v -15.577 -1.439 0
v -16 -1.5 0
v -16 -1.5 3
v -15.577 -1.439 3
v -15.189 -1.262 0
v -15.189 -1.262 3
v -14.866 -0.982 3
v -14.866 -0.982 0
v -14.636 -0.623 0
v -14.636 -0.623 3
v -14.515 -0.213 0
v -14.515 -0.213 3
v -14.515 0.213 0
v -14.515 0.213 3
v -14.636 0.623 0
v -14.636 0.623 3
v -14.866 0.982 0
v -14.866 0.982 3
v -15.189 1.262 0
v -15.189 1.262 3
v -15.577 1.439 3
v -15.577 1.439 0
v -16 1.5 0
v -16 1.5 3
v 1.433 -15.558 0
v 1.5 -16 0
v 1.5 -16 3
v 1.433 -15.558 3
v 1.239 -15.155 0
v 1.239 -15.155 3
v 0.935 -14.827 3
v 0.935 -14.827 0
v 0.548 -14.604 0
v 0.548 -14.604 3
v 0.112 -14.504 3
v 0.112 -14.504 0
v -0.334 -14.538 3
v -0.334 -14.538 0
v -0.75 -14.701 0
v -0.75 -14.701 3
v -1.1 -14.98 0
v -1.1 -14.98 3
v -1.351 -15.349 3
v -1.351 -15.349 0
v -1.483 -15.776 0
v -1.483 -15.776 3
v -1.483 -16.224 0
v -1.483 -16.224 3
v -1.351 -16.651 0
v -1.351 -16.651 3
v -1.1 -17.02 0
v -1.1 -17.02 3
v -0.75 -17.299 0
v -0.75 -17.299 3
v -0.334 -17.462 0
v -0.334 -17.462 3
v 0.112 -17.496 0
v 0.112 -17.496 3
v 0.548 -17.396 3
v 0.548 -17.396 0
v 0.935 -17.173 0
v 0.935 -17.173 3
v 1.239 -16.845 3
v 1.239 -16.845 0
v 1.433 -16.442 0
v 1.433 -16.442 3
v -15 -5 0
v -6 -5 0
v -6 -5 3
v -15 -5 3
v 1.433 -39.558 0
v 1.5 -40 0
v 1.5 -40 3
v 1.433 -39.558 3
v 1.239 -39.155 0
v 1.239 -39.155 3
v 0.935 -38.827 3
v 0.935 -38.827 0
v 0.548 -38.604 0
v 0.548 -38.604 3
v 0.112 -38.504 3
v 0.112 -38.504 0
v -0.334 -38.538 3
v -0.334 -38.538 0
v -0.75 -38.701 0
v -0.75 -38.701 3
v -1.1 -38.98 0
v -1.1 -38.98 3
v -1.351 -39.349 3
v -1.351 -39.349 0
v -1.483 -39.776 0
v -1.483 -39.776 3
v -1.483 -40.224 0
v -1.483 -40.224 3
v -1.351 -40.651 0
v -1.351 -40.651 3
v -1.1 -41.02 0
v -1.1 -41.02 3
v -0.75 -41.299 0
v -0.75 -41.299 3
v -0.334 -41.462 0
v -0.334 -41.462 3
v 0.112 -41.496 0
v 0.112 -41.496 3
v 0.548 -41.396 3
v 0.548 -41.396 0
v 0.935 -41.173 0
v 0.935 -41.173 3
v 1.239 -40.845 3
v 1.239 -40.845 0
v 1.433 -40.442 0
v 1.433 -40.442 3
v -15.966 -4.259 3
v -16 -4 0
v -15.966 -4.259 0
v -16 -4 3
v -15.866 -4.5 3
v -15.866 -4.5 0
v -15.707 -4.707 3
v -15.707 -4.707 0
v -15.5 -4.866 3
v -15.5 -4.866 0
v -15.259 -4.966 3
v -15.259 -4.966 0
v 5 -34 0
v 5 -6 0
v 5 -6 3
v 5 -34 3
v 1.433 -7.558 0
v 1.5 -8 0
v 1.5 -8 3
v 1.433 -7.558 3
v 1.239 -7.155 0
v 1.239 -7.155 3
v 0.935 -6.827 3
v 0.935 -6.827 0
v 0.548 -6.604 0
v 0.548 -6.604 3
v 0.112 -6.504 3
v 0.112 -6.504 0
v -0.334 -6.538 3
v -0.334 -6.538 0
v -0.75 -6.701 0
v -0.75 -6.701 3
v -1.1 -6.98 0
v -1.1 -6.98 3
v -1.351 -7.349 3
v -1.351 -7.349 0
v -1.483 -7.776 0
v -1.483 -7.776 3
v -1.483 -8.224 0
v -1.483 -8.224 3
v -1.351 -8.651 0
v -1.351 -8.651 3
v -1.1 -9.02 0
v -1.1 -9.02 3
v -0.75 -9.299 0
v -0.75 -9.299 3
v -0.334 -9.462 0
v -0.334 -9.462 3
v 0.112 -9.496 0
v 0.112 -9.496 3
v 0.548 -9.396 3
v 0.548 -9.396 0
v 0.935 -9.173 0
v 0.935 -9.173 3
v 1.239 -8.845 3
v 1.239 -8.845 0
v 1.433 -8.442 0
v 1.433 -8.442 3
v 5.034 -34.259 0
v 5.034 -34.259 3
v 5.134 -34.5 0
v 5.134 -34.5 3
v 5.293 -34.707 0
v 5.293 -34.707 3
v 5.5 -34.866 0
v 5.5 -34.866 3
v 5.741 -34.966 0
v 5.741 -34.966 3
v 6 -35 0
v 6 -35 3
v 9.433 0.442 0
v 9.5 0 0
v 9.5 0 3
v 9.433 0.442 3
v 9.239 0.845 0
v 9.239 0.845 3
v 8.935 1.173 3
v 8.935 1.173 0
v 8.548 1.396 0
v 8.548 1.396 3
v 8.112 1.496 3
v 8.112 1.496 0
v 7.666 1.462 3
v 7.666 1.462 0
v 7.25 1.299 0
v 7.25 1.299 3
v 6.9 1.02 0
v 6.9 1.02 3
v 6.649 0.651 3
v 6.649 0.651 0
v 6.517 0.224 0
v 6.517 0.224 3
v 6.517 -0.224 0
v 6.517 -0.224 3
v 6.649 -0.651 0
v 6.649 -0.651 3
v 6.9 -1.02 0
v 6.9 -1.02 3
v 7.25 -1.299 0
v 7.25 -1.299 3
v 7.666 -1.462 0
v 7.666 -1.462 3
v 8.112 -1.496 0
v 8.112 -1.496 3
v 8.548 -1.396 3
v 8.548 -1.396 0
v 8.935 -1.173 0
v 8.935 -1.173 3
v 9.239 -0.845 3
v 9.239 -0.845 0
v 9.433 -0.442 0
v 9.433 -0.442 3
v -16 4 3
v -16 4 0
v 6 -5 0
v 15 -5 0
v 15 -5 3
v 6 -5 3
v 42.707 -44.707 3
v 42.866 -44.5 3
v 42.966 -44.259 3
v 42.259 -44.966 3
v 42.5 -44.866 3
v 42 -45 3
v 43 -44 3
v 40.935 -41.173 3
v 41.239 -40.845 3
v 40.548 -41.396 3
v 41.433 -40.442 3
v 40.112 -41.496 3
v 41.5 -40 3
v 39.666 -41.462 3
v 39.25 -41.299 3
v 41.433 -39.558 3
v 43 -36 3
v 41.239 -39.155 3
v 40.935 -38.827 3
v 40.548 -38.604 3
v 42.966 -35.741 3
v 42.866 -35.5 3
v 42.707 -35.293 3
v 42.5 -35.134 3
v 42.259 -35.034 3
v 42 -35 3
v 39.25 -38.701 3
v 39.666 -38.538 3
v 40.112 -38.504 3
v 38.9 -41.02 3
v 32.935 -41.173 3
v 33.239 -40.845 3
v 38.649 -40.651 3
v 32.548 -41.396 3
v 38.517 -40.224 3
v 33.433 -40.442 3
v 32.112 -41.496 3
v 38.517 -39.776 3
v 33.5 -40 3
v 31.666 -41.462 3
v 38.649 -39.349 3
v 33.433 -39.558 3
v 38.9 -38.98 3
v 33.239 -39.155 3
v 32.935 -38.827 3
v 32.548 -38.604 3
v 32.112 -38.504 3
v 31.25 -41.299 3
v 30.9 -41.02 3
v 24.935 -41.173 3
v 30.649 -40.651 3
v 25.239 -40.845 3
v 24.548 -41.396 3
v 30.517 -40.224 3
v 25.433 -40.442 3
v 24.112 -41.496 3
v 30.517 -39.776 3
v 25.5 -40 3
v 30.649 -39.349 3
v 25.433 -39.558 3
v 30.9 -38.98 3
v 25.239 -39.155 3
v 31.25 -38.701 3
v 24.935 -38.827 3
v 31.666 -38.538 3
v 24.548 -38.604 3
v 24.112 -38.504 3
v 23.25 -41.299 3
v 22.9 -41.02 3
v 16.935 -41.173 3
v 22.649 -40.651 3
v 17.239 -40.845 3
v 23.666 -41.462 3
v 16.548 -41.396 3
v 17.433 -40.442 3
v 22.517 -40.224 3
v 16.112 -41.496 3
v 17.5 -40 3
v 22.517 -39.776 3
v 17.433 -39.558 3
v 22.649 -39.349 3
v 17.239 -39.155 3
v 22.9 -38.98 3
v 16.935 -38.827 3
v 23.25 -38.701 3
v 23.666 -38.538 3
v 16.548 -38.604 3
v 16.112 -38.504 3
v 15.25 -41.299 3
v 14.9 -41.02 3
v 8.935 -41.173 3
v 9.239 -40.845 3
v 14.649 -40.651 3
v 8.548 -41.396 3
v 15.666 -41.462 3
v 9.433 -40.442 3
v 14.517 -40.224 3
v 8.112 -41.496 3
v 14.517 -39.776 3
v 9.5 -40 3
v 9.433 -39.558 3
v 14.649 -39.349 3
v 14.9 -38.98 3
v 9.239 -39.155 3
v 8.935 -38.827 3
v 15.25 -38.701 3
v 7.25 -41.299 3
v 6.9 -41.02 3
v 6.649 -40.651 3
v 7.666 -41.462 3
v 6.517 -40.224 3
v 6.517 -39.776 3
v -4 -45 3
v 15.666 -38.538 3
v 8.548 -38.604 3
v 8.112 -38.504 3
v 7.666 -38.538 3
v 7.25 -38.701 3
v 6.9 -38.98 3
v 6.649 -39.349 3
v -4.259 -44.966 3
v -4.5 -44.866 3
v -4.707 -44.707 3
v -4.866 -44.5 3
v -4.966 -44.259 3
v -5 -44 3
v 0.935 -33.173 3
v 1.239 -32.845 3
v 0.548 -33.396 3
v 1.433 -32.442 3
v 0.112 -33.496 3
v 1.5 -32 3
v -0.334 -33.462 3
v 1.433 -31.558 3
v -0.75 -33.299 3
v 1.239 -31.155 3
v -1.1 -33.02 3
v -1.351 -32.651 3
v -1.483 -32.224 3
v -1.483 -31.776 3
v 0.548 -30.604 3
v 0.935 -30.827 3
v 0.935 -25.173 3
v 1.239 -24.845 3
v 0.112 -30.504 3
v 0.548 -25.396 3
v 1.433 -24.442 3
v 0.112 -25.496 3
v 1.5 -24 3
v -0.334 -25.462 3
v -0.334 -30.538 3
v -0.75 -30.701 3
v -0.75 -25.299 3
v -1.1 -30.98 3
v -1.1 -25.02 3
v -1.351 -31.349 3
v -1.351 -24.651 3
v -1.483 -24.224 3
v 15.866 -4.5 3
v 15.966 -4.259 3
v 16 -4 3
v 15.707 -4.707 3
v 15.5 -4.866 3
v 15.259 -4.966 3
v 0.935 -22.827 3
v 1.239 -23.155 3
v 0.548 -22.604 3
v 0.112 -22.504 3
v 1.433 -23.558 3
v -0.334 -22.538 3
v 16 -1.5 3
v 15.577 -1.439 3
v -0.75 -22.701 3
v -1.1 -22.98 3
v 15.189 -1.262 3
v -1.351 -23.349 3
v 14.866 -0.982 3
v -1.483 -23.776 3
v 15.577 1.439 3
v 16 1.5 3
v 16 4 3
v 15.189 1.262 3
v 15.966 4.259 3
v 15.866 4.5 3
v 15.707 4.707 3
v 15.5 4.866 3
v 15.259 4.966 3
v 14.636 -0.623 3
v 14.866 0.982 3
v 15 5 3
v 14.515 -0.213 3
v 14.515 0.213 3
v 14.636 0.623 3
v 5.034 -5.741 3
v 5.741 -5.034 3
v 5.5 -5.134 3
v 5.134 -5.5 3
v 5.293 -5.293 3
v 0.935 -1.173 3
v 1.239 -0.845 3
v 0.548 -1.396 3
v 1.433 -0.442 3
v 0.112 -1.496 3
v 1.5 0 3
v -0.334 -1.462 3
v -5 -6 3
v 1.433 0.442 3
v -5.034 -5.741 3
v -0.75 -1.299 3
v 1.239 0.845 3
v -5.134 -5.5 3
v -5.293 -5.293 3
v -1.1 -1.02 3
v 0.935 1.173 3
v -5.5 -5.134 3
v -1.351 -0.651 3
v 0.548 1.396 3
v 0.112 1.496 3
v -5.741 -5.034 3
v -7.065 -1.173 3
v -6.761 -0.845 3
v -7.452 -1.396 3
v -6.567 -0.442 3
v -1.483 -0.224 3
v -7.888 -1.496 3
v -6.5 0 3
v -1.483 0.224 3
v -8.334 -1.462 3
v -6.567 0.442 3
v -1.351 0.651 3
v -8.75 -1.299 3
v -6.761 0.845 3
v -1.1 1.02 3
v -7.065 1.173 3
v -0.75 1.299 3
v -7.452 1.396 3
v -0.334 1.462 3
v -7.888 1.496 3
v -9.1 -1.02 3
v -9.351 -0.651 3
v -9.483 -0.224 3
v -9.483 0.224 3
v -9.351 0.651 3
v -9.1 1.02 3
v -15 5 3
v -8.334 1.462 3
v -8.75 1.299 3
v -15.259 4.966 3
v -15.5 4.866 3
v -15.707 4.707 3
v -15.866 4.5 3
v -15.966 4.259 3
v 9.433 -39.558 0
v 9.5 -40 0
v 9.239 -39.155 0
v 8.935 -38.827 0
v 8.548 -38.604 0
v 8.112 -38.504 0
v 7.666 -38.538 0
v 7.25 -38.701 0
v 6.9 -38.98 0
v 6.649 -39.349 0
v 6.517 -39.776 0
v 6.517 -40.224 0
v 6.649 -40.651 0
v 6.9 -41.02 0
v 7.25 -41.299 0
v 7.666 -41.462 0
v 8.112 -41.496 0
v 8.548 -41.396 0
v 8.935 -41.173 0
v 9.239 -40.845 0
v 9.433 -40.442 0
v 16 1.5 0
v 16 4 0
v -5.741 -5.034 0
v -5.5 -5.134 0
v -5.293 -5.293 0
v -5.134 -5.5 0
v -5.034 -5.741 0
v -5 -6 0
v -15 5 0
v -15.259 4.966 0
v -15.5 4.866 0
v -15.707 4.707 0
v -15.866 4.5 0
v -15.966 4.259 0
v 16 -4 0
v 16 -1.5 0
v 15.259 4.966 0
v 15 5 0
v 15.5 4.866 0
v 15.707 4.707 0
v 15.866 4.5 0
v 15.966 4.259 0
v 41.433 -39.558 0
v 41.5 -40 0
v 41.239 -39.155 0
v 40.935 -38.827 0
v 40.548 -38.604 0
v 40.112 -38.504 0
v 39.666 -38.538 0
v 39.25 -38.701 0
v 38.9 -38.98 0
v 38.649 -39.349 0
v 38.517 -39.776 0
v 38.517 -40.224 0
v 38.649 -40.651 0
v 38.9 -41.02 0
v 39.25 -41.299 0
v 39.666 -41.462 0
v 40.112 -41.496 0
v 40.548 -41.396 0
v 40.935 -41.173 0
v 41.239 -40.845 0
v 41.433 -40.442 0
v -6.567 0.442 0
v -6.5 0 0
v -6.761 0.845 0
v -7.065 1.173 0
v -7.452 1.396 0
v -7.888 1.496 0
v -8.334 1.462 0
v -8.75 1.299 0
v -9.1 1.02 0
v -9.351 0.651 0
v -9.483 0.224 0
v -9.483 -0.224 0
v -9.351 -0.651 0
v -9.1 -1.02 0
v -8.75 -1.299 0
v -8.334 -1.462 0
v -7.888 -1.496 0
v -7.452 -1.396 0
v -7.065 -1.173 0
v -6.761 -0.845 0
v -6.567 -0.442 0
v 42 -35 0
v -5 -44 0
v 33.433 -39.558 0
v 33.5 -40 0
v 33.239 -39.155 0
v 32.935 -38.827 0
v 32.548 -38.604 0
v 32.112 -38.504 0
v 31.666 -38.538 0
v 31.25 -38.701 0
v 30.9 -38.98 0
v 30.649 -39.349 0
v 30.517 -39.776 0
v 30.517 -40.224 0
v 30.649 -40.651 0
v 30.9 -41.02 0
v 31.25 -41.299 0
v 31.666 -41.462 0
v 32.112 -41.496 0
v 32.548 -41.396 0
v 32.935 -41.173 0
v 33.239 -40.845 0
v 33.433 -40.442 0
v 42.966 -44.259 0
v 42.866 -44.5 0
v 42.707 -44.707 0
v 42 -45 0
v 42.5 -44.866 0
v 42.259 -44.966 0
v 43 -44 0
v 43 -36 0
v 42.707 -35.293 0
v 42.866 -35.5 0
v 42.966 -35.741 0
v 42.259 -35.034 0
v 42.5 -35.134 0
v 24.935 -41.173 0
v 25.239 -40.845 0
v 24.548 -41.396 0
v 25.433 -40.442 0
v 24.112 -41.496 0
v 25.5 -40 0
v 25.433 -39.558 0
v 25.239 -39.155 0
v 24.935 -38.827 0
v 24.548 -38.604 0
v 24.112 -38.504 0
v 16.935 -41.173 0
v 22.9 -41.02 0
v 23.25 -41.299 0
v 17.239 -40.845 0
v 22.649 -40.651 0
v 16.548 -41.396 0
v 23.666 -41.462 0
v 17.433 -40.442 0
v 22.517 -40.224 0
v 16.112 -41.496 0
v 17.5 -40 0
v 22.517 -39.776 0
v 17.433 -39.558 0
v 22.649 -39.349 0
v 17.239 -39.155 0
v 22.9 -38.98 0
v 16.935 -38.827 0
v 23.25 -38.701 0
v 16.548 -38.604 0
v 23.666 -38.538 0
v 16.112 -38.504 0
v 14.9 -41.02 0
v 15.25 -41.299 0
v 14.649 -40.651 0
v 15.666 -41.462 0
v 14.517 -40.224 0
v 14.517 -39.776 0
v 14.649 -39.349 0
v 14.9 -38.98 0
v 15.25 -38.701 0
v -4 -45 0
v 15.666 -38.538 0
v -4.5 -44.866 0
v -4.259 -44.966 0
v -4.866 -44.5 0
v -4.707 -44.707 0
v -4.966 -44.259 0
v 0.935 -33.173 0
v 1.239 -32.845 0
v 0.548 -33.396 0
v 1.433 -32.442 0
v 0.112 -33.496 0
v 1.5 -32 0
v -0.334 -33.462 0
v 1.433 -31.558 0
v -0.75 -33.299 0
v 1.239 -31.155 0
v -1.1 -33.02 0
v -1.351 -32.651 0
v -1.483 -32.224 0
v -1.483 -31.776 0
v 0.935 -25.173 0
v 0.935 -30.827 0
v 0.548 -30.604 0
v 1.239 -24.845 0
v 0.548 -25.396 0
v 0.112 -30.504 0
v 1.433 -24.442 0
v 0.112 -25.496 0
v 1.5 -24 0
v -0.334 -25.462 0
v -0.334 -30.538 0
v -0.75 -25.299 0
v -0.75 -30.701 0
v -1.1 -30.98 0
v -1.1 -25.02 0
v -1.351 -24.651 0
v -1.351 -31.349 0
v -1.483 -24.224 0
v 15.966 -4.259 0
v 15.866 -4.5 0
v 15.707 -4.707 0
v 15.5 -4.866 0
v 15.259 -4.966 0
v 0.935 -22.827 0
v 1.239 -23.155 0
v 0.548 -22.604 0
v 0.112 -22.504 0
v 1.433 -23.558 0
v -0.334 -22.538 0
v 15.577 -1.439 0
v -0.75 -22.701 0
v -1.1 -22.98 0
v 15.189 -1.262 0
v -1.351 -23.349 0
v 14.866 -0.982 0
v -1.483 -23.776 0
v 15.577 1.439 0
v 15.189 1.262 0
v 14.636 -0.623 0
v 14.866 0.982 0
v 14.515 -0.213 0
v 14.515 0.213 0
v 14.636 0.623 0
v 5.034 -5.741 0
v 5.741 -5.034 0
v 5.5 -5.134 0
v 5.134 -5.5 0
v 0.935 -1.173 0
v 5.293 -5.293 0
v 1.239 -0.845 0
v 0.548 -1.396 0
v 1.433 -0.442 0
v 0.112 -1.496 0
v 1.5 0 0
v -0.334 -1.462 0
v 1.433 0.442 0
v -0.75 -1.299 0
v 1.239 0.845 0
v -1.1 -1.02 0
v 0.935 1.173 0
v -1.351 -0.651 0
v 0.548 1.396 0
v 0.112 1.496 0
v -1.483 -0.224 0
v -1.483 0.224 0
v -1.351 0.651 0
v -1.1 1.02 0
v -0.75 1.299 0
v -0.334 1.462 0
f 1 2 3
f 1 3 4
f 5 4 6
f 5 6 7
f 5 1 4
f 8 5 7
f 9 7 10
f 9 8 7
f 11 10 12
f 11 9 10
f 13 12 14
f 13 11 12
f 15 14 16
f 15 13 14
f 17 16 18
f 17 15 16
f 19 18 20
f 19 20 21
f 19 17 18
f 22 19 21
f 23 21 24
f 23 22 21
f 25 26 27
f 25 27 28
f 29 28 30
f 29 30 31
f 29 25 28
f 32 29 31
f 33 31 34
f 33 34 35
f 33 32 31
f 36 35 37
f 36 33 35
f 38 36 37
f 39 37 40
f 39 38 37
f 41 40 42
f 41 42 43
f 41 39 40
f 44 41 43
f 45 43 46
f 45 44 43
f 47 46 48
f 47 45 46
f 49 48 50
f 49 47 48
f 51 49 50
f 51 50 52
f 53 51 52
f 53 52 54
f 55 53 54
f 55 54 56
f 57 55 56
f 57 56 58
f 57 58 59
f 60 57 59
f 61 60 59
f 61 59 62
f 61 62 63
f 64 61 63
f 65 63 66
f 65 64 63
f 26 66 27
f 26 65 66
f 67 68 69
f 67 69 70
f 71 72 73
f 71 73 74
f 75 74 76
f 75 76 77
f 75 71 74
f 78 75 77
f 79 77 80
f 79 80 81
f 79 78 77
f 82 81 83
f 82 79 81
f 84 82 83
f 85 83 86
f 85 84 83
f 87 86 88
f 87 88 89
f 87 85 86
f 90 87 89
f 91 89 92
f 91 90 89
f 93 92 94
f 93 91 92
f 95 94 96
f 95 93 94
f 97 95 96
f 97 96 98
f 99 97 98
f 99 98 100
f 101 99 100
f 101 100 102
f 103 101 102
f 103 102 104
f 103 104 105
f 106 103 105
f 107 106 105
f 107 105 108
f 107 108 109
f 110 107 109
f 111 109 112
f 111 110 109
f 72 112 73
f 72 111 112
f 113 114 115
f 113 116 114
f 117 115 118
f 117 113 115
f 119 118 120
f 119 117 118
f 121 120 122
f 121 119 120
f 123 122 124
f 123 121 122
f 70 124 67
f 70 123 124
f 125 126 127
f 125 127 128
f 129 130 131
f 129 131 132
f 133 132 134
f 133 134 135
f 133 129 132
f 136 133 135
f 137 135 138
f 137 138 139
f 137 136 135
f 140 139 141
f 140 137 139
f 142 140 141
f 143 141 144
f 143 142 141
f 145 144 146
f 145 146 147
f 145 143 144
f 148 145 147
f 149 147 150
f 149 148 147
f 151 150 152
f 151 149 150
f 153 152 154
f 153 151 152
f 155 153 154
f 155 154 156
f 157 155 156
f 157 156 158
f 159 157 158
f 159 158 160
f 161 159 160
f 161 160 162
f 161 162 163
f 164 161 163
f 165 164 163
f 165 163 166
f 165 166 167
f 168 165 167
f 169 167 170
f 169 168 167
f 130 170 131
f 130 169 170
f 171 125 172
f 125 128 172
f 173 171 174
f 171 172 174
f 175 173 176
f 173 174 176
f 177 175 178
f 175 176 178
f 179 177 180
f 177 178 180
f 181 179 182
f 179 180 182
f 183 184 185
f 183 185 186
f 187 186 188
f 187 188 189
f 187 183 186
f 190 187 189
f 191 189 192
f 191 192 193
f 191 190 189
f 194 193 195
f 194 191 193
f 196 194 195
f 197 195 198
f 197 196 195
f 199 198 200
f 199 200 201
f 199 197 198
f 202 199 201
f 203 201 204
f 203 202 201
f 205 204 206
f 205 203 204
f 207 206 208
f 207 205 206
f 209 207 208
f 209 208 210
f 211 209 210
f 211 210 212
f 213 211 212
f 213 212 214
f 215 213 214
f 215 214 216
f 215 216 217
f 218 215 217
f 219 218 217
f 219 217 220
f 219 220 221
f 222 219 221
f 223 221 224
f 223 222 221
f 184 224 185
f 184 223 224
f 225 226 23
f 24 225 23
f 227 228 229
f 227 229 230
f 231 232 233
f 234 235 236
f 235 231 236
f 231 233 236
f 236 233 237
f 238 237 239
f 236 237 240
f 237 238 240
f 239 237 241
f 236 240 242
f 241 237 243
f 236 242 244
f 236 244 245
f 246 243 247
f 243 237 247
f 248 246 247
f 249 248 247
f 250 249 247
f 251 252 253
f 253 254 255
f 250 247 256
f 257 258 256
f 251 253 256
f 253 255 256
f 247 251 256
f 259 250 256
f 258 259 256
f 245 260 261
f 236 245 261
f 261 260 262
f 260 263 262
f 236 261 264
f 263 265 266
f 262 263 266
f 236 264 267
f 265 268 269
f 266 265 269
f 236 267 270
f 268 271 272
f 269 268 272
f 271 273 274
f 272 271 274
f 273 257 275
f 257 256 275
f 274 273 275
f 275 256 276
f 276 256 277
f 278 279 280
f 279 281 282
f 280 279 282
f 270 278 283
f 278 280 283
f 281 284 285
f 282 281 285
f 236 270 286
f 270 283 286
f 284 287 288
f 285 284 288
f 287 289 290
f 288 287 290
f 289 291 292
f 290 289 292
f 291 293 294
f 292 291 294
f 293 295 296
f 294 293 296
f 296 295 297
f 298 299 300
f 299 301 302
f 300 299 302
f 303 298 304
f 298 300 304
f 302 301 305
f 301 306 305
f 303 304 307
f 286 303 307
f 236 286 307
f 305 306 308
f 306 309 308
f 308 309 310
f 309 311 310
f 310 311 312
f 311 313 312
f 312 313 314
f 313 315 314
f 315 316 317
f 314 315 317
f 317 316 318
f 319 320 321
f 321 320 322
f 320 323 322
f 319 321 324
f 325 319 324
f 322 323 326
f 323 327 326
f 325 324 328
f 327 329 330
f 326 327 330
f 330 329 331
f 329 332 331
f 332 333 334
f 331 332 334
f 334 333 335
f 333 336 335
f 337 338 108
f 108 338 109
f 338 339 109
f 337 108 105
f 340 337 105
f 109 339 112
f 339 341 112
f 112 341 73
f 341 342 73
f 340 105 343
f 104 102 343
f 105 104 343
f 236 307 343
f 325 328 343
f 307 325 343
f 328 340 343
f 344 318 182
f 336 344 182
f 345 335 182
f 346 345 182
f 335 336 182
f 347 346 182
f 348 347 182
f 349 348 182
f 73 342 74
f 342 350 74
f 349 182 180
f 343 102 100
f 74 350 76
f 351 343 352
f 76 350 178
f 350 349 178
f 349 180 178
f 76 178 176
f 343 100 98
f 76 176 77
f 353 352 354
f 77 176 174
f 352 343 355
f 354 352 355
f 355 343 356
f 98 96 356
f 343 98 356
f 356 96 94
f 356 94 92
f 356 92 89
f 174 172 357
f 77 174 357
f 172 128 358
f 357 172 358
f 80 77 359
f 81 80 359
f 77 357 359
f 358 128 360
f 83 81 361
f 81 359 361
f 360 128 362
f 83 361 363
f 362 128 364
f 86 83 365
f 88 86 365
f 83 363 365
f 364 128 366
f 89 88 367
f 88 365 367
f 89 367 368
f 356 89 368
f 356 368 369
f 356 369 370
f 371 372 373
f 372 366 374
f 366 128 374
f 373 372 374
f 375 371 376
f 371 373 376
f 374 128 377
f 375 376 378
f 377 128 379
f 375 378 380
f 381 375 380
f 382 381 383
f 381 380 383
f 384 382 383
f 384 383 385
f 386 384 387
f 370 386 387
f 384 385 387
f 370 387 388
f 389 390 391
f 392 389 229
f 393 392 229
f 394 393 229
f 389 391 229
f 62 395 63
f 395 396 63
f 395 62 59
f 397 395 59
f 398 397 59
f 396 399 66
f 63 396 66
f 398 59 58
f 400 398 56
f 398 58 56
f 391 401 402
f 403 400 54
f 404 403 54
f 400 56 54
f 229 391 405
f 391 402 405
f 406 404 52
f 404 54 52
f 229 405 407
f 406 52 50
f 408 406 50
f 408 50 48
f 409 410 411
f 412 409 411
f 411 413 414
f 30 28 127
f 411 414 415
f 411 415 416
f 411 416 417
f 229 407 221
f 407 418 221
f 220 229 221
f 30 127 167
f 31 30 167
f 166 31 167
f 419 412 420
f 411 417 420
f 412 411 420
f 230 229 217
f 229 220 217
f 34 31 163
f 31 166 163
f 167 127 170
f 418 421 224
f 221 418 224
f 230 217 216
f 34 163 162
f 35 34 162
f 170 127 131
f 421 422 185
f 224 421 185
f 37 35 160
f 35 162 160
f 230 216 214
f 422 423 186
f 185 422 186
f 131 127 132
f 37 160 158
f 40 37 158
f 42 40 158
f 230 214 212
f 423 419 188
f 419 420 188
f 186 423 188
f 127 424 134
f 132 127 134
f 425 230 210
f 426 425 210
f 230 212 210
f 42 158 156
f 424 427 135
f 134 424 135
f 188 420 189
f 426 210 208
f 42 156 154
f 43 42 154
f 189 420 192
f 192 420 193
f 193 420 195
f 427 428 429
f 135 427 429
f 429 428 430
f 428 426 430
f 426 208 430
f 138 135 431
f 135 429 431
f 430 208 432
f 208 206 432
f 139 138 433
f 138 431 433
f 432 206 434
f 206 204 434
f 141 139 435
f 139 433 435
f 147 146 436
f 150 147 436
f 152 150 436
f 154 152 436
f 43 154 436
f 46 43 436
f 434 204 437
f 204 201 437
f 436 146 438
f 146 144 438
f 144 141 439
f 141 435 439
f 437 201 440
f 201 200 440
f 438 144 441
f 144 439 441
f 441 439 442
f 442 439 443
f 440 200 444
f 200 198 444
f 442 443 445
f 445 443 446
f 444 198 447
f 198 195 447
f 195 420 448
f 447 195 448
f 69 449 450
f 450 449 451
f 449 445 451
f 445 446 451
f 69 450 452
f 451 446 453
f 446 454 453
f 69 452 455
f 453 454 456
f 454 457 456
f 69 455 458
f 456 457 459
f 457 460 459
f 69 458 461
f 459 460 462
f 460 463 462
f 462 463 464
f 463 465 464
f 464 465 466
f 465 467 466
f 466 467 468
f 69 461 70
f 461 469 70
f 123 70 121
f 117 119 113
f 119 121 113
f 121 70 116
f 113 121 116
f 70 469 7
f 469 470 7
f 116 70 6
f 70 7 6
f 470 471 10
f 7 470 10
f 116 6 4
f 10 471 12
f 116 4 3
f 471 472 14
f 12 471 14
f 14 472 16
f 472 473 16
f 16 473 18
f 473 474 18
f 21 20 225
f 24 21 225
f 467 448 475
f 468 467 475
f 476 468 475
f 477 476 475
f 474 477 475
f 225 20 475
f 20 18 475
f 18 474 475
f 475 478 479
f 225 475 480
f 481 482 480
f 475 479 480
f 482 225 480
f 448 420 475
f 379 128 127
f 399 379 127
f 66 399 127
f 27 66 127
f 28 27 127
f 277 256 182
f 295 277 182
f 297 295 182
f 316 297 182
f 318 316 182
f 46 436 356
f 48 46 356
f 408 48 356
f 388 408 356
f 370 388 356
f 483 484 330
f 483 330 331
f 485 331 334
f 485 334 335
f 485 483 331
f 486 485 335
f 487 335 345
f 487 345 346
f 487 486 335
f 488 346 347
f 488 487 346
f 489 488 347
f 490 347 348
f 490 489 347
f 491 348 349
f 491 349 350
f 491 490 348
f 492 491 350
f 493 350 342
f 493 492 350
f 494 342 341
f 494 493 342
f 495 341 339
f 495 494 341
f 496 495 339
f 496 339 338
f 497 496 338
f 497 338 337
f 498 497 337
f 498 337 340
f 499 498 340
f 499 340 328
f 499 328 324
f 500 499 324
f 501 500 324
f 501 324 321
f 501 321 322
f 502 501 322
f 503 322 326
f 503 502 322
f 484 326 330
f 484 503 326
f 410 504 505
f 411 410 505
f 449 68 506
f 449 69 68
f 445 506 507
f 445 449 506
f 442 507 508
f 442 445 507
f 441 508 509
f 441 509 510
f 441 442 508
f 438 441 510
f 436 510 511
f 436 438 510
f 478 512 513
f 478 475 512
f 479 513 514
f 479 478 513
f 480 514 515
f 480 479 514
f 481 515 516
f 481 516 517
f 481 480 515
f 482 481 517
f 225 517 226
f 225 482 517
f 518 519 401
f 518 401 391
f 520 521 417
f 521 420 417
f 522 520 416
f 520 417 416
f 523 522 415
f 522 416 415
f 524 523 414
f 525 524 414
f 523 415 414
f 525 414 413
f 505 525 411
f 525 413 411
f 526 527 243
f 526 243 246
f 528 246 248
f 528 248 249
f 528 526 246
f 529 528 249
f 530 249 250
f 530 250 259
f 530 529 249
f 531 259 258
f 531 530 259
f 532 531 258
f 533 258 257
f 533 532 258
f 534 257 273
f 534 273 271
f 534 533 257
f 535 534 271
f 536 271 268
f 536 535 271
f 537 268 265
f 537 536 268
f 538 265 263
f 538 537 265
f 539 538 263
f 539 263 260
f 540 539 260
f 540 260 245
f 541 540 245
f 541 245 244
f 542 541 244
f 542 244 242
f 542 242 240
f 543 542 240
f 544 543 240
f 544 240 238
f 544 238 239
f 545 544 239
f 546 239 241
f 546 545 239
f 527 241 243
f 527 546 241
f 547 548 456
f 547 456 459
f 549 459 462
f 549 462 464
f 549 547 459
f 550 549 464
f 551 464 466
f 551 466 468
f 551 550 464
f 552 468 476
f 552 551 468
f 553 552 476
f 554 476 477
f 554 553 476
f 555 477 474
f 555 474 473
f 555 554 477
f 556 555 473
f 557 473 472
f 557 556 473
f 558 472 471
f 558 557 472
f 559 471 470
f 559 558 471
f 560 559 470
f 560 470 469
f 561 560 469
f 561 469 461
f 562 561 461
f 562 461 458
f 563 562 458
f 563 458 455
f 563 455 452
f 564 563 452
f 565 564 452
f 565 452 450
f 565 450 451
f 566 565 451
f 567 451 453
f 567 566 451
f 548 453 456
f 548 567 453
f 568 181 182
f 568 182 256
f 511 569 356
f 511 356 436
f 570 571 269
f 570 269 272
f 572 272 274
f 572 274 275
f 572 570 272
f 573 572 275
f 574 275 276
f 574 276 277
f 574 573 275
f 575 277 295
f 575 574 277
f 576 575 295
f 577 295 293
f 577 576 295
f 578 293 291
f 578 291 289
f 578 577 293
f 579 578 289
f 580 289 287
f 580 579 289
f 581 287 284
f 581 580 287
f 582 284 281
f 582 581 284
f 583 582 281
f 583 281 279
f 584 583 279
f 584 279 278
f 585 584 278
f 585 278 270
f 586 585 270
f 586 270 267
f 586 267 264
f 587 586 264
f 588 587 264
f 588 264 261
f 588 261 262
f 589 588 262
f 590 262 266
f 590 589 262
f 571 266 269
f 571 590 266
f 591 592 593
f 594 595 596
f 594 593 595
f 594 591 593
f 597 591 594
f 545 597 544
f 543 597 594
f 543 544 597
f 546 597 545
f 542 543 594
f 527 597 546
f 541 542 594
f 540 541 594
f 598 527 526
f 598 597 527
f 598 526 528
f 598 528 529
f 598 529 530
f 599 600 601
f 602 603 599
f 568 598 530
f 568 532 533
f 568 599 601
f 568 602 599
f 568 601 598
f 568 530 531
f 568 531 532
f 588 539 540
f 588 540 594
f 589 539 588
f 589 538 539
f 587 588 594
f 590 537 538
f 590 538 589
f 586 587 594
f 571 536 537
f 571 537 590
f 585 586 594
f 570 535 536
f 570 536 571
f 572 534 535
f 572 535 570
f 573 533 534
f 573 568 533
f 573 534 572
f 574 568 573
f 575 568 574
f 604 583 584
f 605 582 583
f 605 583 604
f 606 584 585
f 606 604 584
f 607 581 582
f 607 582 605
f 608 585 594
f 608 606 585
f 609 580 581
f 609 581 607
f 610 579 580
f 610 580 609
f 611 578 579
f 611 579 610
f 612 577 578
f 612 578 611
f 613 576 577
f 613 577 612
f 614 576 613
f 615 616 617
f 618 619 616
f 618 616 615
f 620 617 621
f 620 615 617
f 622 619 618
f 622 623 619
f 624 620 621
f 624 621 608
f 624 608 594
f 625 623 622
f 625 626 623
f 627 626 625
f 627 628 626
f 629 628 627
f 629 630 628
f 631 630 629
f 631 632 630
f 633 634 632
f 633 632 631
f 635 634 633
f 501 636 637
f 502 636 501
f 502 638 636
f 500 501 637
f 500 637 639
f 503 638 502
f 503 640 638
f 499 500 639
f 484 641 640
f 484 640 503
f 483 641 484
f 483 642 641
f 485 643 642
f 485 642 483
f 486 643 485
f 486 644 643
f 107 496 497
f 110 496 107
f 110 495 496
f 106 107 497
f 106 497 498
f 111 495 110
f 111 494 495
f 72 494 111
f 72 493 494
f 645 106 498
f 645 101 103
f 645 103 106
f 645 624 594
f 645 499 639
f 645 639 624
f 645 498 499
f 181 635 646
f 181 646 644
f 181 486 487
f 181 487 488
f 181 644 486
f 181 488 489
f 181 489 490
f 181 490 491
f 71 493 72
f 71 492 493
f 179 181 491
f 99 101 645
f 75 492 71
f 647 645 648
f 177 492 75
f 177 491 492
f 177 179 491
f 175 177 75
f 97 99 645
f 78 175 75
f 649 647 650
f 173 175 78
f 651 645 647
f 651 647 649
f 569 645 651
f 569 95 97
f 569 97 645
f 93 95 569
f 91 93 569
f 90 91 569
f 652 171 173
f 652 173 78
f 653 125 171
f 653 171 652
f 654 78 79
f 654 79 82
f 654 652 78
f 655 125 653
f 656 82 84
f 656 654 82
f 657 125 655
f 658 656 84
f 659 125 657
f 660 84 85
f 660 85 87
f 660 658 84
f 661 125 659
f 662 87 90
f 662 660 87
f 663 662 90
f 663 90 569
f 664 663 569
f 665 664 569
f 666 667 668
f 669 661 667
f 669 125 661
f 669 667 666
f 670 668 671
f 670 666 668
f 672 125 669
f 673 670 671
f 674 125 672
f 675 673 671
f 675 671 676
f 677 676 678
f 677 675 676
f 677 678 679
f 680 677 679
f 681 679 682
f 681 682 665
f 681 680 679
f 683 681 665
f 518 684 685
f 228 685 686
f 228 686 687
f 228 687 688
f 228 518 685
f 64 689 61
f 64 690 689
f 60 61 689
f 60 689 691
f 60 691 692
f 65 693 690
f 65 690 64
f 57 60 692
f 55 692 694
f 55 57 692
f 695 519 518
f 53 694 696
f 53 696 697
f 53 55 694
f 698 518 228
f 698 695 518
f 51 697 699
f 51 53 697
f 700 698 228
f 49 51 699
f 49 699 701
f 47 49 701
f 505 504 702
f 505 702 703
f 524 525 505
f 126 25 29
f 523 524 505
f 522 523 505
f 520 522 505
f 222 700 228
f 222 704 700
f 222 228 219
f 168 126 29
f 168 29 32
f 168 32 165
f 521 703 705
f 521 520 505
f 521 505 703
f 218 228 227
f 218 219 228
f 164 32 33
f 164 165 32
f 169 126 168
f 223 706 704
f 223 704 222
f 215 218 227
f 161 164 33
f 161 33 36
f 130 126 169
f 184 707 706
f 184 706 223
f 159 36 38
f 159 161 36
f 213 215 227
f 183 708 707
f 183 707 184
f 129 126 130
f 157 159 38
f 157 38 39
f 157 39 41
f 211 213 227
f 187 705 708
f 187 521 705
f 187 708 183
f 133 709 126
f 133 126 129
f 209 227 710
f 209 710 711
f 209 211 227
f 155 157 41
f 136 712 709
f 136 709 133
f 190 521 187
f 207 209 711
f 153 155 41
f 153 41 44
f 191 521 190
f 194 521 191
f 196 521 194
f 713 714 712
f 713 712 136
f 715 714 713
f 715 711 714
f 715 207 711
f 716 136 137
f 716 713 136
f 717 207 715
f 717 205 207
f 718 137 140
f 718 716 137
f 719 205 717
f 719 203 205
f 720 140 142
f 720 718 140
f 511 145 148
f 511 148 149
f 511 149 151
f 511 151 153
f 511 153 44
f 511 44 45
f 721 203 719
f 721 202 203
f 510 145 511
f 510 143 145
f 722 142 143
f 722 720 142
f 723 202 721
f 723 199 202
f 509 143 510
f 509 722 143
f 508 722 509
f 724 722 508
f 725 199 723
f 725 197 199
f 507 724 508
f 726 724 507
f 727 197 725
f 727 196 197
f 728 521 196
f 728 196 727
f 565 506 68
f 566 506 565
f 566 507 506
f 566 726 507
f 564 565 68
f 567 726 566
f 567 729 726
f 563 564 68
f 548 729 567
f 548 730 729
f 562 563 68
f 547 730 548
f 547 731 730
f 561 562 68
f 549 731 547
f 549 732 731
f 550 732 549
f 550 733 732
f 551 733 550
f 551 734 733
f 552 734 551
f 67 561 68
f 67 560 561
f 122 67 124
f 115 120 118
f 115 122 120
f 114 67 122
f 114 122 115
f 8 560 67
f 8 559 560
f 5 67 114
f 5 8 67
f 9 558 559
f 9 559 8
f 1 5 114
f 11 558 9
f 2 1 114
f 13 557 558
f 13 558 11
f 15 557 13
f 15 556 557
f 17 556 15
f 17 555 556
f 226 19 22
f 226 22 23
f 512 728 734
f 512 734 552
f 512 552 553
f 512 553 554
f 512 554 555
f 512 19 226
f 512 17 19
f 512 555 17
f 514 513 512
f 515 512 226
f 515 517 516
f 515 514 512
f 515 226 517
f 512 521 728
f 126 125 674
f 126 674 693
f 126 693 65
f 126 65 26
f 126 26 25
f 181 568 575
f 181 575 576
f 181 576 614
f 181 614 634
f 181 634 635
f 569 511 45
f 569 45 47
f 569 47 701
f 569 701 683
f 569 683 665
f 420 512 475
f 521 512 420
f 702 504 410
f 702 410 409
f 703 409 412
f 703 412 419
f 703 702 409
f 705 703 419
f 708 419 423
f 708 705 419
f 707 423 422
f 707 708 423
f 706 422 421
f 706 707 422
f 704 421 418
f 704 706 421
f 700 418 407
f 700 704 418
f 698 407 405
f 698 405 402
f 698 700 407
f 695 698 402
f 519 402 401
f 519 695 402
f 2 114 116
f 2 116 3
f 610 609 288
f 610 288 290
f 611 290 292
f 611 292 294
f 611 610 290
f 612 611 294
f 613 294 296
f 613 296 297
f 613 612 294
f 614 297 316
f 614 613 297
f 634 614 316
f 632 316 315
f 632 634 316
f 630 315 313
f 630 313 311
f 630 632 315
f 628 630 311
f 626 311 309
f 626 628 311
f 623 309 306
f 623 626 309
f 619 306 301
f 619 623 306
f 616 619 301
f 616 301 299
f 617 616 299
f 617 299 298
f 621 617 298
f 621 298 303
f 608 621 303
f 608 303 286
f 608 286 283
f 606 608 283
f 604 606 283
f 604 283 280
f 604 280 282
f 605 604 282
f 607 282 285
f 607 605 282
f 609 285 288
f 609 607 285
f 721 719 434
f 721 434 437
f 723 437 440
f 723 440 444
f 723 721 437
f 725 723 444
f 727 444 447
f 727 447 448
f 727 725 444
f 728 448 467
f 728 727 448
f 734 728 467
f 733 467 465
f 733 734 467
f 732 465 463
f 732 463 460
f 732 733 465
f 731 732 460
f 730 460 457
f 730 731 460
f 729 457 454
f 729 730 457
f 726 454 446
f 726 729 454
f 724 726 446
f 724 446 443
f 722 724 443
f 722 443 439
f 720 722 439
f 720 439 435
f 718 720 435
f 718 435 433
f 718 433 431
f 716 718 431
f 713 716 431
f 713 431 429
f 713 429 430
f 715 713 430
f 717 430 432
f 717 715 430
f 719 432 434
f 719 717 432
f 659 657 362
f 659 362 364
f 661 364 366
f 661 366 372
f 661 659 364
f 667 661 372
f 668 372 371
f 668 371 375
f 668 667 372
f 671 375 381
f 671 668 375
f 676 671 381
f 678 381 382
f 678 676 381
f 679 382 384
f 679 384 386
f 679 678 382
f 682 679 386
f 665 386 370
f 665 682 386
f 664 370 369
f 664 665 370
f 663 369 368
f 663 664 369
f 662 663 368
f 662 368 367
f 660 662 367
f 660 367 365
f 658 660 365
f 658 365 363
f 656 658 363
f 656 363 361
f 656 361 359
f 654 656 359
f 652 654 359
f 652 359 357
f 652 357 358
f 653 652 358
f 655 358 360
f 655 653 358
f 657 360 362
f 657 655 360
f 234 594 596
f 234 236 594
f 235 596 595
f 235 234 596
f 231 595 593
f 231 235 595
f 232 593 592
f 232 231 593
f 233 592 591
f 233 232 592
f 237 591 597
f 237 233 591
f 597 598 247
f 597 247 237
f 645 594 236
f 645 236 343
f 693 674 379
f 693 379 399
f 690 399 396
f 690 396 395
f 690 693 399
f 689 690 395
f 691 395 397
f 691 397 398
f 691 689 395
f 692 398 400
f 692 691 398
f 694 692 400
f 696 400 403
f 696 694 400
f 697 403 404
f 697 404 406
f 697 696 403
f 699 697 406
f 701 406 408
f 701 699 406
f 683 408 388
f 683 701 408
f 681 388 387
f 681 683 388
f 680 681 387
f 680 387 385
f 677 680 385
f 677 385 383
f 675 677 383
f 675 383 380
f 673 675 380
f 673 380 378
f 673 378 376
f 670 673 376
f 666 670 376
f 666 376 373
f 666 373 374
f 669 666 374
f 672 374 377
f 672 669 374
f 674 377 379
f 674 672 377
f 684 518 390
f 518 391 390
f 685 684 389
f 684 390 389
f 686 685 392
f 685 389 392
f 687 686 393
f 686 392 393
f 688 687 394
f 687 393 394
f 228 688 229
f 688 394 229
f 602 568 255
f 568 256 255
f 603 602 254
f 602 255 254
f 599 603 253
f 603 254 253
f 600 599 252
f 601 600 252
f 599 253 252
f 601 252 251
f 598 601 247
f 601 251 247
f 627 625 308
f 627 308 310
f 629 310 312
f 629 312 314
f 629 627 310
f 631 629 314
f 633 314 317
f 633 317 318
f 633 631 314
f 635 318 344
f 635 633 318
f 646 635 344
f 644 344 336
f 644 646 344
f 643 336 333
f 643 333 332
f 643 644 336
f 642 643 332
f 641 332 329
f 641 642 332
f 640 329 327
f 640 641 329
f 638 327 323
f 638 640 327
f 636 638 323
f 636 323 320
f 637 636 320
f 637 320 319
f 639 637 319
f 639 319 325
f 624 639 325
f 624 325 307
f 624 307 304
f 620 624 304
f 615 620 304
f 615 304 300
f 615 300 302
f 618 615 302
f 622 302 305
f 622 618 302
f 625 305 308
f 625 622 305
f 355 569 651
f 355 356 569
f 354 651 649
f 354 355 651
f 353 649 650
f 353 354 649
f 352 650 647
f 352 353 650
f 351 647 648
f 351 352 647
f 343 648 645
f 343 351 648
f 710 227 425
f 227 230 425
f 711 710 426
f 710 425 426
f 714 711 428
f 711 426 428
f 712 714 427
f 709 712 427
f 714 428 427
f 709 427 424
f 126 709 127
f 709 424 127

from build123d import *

# Parameters (mm, degrees)
SKETCH_R  = 1.5
PAD_DEPTH = 3
FILLET_R  = 1


with BuildPart() as part:
    # Sketch → Pad (new body)
    with BuildSketch(Plane.XY):
        with BuildLine():
            Line((-16, 5), (16, 5))
            Line((16, 1.5), (16, 5))
            ThreePointArc((16, 1.5), (14.5, 0), (16, -1.5))
            Line((16, -1.5), (16, -5))
            Line((16, -5), (5, -5))
            Line((5, -5), (5, -35))
            Line((5, -35), (43, -35))
            Line((43, -35), (43, -45))
            Line((43, -45), (-5, -45))
            Line((-5, -45), (-5, -35))
            Line((-5, -35), (-5, -5))
            Line((-5, -5), (-16, -5))
            Line((-16, -5), (-16, -1.5))
            ThreePointArc((-16, -1.5), (-14.5, 0), (-16, 1.5))
            Line((-16, 5), (-16, 1.5))
        make_face()
        with Locations((-8, 0)):
            Circle(SKETCH_R, mode=Mode.SUBTRACT)
        Circle(SKETCH_R, mode=Mode.SUBTRACT)
        with Locations((8, 0)):
            Circle(SKETCH_R, mode=Mode.SUBTRACT)
        with Locations((0, -8)):
            Circle(SKETCH_R, mode=Mode.SUBTRACT)
        with Locations((0, -16)):
            Circle(SKETCH_R, mode=Mode.SUBTRACT)
        with Locations((0, -24)):
            Circle(SKETCH_R, mode=Mode.SUBTRACT)
        with Locations((0, -32)):
            Circle(SKETCH_R, mode=Mode.SUBTRACT)
        with Locations((0, -40)):
            Circle(SKETCH_R, mode=Mode.SUBTRACT)
        with Locations((8, -40)):
            Circle(SKETCH_R, mode=Mode.SUBTRACT)
        with Locations((16, -40)):
            Circle(SKETCH_R, mode=Mode.SUBTRACT)
        with Locations((24, -40)):
            Circle(SKETCH_R, mode=Mode.SUBTRACT)
        with Locations((32, -40)):
            Circle(SKETCH_R, mode=Mode.SUBTRACT)
        with Locations((40, -40)):
            Circle(SKETCH_R, mode=Mode.SUBTRACT)
    extrude(amount=PAD_DEPTH)

    # Fillet
    fillet_edges = [part.edges().sort_by_distance(p)[0] for p in [
        (-16, 5, 1.5),
        (-16, -5, 1.5),
        (16, 5, 1.5),
        (16, -5, 1.5),
        (43, -35, 1.5),
        (5, -35, 1.5),
        (43, -45, 1.5),
        (-5, -45, 1.5),
        (5, -5, 1.5),
        (-5, -5, 1.5),
    ]]
    fillet(fillet_edges, radius=FILLET_R)


solid = part.part
